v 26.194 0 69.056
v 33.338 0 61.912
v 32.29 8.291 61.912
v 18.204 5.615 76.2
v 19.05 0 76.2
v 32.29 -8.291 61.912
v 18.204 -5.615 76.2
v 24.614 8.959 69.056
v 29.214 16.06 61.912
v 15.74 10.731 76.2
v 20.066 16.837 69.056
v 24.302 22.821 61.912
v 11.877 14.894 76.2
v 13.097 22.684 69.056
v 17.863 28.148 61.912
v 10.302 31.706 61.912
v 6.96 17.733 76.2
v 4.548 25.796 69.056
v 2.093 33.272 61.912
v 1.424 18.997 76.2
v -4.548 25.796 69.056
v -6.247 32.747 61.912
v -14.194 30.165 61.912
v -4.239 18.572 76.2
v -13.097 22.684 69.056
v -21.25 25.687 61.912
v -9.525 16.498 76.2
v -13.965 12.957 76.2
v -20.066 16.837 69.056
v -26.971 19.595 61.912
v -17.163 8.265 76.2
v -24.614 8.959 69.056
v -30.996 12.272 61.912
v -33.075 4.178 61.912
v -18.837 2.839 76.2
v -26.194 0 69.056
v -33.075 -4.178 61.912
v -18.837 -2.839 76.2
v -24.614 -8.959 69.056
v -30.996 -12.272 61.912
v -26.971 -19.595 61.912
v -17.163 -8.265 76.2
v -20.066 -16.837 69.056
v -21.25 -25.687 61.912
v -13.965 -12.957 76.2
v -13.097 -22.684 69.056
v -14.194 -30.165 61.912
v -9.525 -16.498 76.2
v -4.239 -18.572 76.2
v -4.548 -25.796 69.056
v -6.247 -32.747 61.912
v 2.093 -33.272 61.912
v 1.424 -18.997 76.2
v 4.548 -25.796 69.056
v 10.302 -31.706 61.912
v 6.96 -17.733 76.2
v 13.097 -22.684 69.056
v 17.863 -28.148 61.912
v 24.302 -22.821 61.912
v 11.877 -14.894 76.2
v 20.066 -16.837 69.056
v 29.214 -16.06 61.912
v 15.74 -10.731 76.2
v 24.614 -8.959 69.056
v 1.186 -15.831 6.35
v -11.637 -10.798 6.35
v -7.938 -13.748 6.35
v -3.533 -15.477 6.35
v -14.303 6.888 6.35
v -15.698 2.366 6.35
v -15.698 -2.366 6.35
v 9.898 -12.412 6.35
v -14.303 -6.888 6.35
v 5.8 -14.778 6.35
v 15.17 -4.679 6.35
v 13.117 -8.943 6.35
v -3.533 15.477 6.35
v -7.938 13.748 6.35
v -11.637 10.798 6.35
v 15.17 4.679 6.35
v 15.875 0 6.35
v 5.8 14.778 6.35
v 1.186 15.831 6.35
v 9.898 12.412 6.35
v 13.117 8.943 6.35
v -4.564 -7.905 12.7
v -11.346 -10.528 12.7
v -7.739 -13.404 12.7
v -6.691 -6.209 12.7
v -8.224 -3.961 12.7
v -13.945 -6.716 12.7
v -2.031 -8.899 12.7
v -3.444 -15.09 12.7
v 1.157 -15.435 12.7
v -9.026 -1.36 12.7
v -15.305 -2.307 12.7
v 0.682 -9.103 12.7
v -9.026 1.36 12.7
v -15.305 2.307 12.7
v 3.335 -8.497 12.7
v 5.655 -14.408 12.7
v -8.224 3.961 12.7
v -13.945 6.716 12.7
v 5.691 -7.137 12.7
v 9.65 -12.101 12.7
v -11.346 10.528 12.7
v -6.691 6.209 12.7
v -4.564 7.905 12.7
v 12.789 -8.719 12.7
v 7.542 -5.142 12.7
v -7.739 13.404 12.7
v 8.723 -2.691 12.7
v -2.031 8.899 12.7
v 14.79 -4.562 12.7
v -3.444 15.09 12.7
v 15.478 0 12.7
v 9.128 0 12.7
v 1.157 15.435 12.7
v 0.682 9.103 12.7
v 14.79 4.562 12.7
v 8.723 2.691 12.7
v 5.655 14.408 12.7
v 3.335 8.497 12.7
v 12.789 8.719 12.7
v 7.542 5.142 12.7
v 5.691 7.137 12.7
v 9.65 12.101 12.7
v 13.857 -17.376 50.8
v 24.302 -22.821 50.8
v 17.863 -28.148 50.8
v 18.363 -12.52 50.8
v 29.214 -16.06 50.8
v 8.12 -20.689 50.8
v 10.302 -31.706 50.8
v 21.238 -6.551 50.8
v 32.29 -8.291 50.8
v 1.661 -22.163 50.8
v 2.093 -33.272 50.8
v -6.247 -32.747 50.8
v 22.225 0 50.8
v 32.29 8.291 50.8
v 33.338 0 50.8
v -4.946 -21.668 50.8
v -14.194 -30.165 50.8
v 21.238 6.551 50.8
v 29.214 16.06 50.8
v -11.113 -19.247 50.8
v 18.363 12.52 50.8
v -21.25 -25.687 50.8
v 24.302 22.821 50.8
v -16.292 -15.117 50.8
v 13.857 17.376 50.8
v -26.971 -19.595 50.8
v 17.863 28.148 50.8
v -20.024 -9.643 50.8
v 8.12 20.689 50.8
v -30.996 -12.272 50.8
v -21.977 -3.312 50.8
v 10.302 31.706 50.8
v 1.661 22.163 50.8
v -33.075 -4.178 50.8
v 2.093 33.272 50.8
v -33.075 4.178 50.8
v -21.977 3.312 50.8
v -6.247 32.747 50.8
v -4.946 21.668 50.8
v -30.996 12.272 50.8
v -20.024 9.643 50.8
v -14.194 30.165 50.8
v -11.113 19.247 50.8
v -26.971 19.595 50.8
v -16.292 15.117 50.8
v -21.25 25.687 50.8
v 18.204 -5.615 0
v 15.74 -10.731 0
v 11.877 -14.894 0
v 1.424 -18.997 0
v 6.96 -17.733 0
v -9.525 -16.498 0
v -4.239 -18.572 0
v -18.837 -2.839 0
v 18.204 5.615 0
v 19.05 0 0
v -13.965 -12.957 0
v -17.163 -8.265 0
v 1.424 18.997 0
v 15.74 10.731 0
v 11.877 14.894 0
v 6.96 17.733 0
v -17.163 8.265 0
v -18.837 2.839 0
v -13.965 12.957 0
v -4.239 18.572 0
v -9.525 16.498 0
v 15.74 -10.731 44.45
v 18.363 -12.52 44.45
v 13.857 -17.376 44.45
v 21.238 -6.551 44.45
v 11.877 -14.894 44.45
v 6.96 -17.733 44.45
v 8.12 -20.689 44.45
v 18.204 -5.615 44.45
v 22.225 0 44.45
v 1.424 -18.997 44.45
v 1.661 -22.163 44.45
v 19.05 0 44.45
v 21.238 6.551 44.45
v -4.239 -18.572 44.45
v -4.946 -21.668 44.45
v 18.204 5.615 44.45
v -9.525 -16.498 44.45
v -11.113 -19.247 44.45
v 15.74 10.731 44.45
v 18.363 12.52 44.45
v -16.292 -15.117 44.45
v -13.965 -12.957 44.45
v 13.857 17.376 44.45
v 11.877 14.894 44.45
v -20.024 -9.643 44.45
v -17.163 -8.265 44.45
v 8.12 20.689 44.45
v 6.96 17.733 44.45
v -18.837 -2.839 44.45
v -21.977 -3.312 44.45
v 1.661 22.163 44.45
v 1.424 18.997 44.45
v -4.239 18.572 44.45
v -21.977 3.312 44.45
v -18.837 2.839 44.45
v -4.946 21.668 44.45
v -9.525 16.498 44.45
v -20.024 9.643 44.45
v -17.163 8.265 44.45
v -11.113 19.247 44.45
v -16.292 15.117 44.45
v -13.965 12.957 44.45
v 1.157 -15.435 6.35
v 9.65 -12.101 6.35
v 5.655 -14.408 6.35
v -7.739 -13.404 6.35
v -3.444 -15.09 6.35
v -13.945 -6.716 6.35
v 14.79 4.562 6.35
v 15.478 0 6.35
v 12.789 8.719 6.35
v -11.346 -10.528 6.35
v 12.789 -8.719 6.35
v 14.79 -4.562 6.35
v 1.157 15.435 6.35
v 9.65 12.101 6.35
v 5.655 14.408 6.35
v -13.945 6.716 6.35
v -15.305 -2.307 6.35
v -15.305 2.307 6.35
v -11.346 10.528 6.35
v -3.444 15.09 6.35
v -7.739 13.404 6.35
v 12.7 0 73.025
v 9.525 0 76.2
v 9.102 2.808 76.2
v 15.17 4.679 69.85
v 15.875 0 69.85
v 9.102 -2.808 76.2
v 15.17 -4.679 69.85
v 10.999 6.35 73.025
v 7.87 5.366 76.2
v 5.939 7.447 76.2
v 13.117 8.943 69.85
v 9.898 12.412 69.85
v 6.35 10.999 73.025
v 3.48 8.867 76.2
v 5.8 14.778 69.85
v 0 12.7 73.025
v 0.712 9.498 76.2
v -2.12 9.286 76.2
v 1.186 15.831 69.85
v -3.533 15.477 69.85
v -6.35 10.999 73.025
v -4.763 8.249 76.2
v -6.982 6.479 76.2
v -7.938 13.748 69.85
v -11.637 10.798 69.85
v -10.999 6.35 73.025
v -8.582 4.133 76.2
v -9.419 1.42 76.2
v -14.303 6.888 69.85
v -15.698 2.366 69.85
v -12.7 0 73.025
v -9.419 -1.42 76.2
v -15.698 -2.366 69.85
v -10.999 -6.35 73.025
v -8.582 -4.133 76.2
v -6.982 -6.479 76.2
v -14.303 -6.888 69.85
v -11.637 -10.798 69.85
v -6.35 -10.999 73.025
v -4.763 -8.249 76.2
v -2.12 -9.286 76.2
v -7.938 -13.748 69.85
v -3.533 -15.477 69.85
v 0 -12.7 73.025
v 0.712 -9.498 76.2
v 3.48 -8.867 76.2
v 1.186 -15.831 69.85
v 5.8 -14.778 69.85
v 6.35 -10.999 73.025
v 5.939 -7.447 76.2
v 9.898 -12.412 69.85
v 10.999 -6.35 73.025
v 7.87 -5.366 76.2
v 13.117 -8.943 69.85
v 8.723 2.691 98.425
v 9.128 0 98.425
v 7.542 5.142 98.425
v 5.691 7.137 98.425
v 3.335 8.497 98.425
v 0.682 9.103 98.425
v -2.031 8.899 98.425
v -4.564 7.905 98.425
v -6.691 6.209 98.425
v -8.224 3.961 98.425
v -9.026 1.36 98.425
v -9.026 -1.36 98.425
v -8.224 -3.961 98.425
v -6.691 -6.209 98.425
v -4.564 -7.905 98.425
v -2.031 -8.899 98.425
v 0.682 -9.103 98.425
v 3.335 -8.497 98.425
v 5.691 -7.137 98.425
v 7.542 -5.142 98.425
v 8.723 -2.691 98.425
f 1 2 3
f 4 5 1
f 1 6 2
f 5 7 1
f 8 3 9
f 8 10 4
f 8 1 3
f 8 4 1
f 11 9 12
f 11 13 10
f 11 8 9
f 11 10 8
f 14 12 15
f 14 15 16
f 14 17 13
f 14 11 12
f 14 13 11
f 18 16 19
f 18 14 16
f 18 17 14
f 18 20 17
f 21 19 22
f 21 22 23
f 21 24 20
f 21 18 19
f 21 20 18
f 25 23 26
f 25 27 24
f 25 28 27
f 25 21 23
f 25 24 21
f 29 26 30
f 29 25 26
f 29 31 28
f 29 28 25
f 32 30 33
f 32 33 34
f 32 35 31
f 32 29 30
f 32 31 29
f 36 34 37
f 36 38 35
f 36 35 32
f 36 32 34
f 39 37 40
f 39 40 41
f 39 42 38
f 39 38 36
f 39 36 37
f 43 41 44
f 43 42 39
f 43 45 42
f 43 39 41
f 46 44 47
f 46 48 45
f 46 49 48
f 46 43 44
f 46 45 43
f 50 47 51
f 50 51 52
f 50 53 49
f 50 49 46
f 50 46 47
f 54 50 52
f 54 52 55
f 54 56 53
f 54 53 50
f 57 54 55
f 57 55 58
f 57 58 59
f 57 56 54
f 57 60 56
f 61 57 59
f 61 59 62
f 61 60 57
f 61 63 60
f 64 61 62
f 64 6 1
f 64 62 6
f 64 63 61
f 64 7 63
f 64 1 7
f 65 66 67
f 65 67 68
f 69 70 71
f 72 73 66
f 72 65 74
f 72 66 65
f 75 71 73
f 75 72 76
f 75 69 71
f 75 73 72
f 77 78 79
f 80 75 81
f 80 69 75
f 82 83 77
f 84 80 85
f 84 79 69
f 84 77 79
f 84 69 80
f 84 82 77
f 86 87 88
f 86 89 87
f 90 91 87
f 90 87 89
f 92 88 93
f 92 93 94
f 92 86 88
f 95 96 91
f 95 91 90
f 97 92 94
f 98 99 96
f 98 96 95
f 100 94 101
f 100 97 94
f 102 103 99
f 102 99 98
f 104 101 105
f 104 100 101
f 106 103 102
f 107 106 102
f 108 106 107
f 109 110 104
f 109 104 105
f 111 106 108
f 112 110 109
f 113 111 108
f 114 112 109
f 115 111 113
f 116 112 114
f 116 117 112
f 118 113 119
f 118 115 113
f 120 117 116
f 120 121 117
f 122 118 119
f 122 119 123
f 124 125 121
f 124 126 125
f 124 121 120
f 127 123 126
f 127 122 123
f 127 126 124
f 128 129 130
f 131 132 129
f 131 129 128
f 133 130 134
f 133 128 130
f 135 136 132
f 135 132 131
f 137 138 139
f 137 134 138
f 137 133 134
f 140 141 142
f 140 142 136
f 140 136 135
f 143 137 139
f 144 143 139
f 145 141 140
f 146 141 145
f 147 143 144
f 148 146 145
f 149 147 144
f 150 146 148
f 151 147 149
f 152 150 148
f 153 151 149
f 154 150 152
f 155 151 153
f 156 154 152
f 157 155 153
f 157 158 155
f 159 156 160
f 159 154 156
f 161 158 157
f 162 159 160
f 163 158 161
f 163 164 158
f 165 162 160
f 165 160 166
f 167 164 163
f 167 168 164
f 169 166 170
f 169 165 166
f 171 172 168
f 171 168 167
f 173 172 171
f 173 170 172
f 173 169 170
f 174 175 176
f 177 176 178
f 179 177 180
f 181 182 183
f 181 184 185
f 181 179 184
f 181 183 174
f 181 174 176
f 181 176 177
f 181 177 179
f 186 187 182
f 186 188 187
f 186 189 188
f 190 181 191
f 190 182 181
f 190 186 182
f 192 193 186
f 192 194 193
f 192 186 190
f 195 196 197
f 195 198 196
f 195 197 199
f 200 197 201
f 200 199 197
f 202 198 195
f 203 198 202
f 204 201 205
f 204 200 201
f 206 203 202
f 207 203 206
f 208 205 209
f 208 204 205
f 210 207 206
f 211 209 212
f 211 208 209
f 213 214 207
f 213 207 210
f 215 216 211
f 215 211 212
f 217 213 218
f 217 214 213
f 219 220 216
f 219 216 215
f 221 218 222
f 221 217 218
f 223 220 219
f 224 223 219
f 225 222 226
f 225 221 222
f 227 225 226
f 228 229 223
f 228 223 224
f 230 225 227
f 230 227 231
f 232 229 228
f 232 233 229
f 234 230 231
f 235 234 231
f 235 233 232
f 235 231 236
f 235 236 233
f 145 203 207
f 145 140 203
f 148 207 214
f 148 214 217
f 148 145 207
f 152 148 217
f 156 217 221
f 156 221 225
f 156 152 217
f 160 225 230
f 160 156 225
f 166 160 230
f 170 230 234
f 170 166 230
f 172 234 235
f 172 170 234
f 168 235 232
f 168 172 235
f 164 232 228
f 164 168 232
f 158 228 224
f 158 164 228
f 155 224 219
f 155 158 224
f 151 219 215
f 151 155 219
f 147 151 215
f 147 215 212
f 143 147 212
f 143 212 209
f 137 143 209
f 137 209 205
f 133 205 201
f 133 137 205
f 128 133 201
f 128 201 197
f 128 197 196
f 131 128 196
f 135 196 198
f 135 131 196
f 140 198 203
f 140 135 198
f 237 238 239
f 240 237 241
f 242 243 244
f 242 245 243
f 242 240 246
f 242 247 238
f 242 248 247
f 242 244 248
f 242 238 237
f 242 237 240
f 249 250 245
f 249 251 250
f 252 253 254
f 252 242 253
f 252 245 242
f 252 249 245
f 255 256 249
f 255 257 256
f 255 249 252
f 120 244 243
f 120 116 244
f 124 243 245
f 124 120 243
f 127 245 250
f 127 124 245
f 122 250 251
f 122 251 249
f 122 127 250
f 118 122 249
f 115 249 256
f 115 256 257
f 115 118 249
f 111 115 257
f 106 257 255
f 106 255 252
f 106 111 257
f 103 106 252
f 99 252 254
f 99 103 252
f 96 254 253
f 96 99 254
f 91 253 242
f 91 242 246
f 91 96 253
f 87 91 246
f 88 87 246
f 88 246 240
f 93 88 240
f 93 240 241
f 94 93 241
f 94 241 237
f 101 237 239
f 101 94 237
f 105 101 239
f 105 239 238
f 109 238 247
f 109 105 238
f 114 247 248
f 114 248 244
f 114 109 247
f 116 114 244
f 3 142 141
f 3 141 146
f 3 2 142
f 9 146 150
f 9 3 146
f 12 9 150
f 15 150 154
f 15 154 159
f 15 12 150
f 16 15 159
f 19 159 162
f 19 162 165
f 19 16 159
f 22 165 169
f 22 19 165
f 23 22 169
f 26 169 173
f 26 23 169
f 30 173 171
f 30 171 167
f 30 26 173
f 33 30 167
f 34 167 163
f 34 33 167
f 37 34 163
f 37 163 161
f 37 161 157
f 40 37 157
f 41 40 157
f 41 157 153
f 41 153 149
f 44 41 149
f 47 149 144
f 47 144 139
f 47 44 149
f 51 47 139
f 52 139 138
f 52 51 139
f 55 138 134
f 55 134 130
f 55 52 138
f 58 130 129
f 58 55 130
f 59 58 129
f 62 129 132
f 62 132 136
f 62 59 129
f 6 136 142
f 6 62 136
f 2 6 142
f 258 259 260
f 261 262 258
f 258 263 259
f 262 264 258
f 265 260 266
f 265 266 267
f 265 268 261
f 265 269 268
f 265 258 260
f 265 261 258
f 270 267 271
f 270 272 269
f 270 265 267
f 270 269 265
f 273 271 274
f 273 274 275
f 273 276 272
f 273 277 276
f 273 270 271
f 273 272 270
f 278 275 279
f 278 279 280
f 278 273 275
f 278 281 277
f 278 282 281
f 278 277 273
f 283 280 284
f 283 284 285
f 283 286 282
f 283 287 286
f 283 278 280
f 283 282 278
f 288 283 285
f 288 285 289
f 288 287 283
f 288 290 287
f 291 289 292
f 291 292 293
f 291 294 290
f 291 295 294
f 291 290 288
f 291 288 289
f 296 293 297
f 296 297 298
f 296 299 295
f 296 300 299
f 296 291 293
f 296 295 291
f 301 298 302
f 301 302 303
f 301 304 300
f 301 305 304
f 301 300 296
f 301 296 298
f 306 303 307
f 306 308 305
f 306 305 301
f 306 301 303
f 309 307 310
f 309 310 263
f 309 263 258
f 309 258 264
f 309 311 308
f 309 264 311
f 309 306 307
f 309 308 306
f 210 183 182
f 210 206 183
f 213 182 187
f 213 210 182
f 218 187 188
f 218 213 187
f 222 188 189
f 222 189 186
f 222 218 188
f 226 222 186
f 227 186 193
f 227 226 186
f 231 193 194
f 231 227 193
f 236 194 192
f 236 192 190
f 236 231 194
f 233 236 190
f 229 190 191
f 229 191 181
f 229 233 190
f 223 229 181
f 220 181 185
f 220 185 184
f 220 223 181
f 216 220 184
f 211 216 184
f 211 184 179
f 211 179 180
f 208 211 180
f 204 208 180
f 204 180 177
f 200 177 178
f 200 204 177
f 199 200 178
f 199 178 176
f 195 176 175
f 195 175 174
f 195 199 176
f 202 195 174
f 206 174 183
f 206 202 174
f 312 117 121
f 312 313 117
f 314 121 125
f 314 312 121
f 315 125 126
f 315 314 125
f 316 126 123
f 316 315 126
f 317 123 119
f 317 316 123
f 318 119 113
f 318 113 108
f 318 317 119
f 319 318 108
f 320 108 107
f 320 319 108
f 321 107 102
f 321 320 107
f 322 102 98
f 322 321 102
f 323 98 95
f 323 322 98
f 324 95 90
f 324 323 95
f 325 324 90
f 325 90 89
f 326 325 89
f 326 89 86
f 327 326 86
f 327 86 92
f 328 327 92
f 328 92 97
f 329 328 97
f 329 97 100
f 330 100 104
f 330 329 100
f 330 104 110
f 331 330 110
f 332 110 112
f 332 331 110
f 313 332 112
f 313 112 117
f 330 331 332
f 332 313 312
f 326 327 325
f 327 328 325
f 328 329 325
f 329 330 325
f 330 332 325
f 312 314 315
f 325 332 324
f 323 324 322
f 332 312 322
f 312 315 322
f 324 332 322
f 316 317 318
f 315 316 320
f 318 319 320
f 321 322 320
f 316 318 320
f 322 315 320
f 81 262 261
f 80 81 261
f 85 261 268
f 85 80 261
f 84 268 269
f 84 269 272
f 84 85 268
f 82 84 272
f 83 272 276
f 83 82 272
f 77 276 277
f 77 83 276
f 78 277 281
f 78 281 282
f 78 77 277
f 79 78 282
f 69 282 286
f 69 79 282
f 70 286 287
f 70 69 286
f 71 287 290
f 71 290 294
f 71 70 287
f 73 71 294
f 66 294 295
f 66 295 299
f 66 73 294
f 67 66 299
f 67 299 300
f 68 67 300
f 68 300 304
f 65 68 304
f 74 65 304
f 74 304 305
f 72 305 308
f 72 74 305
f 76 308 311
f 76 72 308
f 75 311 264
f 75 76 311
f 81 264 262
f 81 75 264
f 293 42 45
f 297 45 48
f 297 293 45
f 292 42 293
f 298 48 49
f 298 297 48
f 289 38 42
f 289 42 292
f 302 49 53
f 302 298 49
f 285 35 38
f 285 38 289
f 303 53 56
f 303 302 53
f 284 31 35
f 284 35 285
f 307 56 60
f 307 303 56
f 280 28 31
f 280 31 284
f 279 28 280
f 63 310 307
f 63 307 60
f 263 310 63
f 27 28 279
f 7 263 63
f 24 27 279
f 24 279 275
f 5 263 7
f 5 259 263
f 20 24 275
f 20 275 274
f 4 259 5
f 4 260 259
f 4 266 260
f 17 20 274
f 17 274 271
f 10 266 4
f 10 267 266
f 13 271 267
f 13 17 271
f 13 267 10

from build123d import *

# Parameters (mm, degrees)
F0_W = 9.128125
F0_H = 22.225


with BuildPart() as f1:
    # F0 (on Front) → F1 (revolve)
    with BuildSketch(Plane.XZ):
        Polygon((0, 6.35), (0, 0), (19.05, 0), (19.05, 44.45), (22.225, 44.45), (22.225, 50.8), (33.3375, 50.8), (33.3375, 61.9125), (19.05, 76.2), (9.525, 76.2), (15.875, 69.85), (15.875, 6.35), (15.478125, 6.35), align=None)
    revolve(axis=Axis((0, 0, 101.430259192), (0, 0, 1)))


with BuildPart() as f2:
    # F0 (on Front) → F2 (revolve)
    with BuildSketch(Plane.XZ):
        with Locations((4.5640625, 87.3125)):
            Rectangle(F0_W, F0_H)
        Polygon((0, 76.2), (0, 6.35), (15.478125, 6.35), (15.478125, 12.7), (9.128125, 12.7), (9.128125, 76.2), align=None)
    revolve(axis=Axis((0, 0, 101.430259192), (0, 0, 1)))


solid = Compound([f1.part, f2.part])
